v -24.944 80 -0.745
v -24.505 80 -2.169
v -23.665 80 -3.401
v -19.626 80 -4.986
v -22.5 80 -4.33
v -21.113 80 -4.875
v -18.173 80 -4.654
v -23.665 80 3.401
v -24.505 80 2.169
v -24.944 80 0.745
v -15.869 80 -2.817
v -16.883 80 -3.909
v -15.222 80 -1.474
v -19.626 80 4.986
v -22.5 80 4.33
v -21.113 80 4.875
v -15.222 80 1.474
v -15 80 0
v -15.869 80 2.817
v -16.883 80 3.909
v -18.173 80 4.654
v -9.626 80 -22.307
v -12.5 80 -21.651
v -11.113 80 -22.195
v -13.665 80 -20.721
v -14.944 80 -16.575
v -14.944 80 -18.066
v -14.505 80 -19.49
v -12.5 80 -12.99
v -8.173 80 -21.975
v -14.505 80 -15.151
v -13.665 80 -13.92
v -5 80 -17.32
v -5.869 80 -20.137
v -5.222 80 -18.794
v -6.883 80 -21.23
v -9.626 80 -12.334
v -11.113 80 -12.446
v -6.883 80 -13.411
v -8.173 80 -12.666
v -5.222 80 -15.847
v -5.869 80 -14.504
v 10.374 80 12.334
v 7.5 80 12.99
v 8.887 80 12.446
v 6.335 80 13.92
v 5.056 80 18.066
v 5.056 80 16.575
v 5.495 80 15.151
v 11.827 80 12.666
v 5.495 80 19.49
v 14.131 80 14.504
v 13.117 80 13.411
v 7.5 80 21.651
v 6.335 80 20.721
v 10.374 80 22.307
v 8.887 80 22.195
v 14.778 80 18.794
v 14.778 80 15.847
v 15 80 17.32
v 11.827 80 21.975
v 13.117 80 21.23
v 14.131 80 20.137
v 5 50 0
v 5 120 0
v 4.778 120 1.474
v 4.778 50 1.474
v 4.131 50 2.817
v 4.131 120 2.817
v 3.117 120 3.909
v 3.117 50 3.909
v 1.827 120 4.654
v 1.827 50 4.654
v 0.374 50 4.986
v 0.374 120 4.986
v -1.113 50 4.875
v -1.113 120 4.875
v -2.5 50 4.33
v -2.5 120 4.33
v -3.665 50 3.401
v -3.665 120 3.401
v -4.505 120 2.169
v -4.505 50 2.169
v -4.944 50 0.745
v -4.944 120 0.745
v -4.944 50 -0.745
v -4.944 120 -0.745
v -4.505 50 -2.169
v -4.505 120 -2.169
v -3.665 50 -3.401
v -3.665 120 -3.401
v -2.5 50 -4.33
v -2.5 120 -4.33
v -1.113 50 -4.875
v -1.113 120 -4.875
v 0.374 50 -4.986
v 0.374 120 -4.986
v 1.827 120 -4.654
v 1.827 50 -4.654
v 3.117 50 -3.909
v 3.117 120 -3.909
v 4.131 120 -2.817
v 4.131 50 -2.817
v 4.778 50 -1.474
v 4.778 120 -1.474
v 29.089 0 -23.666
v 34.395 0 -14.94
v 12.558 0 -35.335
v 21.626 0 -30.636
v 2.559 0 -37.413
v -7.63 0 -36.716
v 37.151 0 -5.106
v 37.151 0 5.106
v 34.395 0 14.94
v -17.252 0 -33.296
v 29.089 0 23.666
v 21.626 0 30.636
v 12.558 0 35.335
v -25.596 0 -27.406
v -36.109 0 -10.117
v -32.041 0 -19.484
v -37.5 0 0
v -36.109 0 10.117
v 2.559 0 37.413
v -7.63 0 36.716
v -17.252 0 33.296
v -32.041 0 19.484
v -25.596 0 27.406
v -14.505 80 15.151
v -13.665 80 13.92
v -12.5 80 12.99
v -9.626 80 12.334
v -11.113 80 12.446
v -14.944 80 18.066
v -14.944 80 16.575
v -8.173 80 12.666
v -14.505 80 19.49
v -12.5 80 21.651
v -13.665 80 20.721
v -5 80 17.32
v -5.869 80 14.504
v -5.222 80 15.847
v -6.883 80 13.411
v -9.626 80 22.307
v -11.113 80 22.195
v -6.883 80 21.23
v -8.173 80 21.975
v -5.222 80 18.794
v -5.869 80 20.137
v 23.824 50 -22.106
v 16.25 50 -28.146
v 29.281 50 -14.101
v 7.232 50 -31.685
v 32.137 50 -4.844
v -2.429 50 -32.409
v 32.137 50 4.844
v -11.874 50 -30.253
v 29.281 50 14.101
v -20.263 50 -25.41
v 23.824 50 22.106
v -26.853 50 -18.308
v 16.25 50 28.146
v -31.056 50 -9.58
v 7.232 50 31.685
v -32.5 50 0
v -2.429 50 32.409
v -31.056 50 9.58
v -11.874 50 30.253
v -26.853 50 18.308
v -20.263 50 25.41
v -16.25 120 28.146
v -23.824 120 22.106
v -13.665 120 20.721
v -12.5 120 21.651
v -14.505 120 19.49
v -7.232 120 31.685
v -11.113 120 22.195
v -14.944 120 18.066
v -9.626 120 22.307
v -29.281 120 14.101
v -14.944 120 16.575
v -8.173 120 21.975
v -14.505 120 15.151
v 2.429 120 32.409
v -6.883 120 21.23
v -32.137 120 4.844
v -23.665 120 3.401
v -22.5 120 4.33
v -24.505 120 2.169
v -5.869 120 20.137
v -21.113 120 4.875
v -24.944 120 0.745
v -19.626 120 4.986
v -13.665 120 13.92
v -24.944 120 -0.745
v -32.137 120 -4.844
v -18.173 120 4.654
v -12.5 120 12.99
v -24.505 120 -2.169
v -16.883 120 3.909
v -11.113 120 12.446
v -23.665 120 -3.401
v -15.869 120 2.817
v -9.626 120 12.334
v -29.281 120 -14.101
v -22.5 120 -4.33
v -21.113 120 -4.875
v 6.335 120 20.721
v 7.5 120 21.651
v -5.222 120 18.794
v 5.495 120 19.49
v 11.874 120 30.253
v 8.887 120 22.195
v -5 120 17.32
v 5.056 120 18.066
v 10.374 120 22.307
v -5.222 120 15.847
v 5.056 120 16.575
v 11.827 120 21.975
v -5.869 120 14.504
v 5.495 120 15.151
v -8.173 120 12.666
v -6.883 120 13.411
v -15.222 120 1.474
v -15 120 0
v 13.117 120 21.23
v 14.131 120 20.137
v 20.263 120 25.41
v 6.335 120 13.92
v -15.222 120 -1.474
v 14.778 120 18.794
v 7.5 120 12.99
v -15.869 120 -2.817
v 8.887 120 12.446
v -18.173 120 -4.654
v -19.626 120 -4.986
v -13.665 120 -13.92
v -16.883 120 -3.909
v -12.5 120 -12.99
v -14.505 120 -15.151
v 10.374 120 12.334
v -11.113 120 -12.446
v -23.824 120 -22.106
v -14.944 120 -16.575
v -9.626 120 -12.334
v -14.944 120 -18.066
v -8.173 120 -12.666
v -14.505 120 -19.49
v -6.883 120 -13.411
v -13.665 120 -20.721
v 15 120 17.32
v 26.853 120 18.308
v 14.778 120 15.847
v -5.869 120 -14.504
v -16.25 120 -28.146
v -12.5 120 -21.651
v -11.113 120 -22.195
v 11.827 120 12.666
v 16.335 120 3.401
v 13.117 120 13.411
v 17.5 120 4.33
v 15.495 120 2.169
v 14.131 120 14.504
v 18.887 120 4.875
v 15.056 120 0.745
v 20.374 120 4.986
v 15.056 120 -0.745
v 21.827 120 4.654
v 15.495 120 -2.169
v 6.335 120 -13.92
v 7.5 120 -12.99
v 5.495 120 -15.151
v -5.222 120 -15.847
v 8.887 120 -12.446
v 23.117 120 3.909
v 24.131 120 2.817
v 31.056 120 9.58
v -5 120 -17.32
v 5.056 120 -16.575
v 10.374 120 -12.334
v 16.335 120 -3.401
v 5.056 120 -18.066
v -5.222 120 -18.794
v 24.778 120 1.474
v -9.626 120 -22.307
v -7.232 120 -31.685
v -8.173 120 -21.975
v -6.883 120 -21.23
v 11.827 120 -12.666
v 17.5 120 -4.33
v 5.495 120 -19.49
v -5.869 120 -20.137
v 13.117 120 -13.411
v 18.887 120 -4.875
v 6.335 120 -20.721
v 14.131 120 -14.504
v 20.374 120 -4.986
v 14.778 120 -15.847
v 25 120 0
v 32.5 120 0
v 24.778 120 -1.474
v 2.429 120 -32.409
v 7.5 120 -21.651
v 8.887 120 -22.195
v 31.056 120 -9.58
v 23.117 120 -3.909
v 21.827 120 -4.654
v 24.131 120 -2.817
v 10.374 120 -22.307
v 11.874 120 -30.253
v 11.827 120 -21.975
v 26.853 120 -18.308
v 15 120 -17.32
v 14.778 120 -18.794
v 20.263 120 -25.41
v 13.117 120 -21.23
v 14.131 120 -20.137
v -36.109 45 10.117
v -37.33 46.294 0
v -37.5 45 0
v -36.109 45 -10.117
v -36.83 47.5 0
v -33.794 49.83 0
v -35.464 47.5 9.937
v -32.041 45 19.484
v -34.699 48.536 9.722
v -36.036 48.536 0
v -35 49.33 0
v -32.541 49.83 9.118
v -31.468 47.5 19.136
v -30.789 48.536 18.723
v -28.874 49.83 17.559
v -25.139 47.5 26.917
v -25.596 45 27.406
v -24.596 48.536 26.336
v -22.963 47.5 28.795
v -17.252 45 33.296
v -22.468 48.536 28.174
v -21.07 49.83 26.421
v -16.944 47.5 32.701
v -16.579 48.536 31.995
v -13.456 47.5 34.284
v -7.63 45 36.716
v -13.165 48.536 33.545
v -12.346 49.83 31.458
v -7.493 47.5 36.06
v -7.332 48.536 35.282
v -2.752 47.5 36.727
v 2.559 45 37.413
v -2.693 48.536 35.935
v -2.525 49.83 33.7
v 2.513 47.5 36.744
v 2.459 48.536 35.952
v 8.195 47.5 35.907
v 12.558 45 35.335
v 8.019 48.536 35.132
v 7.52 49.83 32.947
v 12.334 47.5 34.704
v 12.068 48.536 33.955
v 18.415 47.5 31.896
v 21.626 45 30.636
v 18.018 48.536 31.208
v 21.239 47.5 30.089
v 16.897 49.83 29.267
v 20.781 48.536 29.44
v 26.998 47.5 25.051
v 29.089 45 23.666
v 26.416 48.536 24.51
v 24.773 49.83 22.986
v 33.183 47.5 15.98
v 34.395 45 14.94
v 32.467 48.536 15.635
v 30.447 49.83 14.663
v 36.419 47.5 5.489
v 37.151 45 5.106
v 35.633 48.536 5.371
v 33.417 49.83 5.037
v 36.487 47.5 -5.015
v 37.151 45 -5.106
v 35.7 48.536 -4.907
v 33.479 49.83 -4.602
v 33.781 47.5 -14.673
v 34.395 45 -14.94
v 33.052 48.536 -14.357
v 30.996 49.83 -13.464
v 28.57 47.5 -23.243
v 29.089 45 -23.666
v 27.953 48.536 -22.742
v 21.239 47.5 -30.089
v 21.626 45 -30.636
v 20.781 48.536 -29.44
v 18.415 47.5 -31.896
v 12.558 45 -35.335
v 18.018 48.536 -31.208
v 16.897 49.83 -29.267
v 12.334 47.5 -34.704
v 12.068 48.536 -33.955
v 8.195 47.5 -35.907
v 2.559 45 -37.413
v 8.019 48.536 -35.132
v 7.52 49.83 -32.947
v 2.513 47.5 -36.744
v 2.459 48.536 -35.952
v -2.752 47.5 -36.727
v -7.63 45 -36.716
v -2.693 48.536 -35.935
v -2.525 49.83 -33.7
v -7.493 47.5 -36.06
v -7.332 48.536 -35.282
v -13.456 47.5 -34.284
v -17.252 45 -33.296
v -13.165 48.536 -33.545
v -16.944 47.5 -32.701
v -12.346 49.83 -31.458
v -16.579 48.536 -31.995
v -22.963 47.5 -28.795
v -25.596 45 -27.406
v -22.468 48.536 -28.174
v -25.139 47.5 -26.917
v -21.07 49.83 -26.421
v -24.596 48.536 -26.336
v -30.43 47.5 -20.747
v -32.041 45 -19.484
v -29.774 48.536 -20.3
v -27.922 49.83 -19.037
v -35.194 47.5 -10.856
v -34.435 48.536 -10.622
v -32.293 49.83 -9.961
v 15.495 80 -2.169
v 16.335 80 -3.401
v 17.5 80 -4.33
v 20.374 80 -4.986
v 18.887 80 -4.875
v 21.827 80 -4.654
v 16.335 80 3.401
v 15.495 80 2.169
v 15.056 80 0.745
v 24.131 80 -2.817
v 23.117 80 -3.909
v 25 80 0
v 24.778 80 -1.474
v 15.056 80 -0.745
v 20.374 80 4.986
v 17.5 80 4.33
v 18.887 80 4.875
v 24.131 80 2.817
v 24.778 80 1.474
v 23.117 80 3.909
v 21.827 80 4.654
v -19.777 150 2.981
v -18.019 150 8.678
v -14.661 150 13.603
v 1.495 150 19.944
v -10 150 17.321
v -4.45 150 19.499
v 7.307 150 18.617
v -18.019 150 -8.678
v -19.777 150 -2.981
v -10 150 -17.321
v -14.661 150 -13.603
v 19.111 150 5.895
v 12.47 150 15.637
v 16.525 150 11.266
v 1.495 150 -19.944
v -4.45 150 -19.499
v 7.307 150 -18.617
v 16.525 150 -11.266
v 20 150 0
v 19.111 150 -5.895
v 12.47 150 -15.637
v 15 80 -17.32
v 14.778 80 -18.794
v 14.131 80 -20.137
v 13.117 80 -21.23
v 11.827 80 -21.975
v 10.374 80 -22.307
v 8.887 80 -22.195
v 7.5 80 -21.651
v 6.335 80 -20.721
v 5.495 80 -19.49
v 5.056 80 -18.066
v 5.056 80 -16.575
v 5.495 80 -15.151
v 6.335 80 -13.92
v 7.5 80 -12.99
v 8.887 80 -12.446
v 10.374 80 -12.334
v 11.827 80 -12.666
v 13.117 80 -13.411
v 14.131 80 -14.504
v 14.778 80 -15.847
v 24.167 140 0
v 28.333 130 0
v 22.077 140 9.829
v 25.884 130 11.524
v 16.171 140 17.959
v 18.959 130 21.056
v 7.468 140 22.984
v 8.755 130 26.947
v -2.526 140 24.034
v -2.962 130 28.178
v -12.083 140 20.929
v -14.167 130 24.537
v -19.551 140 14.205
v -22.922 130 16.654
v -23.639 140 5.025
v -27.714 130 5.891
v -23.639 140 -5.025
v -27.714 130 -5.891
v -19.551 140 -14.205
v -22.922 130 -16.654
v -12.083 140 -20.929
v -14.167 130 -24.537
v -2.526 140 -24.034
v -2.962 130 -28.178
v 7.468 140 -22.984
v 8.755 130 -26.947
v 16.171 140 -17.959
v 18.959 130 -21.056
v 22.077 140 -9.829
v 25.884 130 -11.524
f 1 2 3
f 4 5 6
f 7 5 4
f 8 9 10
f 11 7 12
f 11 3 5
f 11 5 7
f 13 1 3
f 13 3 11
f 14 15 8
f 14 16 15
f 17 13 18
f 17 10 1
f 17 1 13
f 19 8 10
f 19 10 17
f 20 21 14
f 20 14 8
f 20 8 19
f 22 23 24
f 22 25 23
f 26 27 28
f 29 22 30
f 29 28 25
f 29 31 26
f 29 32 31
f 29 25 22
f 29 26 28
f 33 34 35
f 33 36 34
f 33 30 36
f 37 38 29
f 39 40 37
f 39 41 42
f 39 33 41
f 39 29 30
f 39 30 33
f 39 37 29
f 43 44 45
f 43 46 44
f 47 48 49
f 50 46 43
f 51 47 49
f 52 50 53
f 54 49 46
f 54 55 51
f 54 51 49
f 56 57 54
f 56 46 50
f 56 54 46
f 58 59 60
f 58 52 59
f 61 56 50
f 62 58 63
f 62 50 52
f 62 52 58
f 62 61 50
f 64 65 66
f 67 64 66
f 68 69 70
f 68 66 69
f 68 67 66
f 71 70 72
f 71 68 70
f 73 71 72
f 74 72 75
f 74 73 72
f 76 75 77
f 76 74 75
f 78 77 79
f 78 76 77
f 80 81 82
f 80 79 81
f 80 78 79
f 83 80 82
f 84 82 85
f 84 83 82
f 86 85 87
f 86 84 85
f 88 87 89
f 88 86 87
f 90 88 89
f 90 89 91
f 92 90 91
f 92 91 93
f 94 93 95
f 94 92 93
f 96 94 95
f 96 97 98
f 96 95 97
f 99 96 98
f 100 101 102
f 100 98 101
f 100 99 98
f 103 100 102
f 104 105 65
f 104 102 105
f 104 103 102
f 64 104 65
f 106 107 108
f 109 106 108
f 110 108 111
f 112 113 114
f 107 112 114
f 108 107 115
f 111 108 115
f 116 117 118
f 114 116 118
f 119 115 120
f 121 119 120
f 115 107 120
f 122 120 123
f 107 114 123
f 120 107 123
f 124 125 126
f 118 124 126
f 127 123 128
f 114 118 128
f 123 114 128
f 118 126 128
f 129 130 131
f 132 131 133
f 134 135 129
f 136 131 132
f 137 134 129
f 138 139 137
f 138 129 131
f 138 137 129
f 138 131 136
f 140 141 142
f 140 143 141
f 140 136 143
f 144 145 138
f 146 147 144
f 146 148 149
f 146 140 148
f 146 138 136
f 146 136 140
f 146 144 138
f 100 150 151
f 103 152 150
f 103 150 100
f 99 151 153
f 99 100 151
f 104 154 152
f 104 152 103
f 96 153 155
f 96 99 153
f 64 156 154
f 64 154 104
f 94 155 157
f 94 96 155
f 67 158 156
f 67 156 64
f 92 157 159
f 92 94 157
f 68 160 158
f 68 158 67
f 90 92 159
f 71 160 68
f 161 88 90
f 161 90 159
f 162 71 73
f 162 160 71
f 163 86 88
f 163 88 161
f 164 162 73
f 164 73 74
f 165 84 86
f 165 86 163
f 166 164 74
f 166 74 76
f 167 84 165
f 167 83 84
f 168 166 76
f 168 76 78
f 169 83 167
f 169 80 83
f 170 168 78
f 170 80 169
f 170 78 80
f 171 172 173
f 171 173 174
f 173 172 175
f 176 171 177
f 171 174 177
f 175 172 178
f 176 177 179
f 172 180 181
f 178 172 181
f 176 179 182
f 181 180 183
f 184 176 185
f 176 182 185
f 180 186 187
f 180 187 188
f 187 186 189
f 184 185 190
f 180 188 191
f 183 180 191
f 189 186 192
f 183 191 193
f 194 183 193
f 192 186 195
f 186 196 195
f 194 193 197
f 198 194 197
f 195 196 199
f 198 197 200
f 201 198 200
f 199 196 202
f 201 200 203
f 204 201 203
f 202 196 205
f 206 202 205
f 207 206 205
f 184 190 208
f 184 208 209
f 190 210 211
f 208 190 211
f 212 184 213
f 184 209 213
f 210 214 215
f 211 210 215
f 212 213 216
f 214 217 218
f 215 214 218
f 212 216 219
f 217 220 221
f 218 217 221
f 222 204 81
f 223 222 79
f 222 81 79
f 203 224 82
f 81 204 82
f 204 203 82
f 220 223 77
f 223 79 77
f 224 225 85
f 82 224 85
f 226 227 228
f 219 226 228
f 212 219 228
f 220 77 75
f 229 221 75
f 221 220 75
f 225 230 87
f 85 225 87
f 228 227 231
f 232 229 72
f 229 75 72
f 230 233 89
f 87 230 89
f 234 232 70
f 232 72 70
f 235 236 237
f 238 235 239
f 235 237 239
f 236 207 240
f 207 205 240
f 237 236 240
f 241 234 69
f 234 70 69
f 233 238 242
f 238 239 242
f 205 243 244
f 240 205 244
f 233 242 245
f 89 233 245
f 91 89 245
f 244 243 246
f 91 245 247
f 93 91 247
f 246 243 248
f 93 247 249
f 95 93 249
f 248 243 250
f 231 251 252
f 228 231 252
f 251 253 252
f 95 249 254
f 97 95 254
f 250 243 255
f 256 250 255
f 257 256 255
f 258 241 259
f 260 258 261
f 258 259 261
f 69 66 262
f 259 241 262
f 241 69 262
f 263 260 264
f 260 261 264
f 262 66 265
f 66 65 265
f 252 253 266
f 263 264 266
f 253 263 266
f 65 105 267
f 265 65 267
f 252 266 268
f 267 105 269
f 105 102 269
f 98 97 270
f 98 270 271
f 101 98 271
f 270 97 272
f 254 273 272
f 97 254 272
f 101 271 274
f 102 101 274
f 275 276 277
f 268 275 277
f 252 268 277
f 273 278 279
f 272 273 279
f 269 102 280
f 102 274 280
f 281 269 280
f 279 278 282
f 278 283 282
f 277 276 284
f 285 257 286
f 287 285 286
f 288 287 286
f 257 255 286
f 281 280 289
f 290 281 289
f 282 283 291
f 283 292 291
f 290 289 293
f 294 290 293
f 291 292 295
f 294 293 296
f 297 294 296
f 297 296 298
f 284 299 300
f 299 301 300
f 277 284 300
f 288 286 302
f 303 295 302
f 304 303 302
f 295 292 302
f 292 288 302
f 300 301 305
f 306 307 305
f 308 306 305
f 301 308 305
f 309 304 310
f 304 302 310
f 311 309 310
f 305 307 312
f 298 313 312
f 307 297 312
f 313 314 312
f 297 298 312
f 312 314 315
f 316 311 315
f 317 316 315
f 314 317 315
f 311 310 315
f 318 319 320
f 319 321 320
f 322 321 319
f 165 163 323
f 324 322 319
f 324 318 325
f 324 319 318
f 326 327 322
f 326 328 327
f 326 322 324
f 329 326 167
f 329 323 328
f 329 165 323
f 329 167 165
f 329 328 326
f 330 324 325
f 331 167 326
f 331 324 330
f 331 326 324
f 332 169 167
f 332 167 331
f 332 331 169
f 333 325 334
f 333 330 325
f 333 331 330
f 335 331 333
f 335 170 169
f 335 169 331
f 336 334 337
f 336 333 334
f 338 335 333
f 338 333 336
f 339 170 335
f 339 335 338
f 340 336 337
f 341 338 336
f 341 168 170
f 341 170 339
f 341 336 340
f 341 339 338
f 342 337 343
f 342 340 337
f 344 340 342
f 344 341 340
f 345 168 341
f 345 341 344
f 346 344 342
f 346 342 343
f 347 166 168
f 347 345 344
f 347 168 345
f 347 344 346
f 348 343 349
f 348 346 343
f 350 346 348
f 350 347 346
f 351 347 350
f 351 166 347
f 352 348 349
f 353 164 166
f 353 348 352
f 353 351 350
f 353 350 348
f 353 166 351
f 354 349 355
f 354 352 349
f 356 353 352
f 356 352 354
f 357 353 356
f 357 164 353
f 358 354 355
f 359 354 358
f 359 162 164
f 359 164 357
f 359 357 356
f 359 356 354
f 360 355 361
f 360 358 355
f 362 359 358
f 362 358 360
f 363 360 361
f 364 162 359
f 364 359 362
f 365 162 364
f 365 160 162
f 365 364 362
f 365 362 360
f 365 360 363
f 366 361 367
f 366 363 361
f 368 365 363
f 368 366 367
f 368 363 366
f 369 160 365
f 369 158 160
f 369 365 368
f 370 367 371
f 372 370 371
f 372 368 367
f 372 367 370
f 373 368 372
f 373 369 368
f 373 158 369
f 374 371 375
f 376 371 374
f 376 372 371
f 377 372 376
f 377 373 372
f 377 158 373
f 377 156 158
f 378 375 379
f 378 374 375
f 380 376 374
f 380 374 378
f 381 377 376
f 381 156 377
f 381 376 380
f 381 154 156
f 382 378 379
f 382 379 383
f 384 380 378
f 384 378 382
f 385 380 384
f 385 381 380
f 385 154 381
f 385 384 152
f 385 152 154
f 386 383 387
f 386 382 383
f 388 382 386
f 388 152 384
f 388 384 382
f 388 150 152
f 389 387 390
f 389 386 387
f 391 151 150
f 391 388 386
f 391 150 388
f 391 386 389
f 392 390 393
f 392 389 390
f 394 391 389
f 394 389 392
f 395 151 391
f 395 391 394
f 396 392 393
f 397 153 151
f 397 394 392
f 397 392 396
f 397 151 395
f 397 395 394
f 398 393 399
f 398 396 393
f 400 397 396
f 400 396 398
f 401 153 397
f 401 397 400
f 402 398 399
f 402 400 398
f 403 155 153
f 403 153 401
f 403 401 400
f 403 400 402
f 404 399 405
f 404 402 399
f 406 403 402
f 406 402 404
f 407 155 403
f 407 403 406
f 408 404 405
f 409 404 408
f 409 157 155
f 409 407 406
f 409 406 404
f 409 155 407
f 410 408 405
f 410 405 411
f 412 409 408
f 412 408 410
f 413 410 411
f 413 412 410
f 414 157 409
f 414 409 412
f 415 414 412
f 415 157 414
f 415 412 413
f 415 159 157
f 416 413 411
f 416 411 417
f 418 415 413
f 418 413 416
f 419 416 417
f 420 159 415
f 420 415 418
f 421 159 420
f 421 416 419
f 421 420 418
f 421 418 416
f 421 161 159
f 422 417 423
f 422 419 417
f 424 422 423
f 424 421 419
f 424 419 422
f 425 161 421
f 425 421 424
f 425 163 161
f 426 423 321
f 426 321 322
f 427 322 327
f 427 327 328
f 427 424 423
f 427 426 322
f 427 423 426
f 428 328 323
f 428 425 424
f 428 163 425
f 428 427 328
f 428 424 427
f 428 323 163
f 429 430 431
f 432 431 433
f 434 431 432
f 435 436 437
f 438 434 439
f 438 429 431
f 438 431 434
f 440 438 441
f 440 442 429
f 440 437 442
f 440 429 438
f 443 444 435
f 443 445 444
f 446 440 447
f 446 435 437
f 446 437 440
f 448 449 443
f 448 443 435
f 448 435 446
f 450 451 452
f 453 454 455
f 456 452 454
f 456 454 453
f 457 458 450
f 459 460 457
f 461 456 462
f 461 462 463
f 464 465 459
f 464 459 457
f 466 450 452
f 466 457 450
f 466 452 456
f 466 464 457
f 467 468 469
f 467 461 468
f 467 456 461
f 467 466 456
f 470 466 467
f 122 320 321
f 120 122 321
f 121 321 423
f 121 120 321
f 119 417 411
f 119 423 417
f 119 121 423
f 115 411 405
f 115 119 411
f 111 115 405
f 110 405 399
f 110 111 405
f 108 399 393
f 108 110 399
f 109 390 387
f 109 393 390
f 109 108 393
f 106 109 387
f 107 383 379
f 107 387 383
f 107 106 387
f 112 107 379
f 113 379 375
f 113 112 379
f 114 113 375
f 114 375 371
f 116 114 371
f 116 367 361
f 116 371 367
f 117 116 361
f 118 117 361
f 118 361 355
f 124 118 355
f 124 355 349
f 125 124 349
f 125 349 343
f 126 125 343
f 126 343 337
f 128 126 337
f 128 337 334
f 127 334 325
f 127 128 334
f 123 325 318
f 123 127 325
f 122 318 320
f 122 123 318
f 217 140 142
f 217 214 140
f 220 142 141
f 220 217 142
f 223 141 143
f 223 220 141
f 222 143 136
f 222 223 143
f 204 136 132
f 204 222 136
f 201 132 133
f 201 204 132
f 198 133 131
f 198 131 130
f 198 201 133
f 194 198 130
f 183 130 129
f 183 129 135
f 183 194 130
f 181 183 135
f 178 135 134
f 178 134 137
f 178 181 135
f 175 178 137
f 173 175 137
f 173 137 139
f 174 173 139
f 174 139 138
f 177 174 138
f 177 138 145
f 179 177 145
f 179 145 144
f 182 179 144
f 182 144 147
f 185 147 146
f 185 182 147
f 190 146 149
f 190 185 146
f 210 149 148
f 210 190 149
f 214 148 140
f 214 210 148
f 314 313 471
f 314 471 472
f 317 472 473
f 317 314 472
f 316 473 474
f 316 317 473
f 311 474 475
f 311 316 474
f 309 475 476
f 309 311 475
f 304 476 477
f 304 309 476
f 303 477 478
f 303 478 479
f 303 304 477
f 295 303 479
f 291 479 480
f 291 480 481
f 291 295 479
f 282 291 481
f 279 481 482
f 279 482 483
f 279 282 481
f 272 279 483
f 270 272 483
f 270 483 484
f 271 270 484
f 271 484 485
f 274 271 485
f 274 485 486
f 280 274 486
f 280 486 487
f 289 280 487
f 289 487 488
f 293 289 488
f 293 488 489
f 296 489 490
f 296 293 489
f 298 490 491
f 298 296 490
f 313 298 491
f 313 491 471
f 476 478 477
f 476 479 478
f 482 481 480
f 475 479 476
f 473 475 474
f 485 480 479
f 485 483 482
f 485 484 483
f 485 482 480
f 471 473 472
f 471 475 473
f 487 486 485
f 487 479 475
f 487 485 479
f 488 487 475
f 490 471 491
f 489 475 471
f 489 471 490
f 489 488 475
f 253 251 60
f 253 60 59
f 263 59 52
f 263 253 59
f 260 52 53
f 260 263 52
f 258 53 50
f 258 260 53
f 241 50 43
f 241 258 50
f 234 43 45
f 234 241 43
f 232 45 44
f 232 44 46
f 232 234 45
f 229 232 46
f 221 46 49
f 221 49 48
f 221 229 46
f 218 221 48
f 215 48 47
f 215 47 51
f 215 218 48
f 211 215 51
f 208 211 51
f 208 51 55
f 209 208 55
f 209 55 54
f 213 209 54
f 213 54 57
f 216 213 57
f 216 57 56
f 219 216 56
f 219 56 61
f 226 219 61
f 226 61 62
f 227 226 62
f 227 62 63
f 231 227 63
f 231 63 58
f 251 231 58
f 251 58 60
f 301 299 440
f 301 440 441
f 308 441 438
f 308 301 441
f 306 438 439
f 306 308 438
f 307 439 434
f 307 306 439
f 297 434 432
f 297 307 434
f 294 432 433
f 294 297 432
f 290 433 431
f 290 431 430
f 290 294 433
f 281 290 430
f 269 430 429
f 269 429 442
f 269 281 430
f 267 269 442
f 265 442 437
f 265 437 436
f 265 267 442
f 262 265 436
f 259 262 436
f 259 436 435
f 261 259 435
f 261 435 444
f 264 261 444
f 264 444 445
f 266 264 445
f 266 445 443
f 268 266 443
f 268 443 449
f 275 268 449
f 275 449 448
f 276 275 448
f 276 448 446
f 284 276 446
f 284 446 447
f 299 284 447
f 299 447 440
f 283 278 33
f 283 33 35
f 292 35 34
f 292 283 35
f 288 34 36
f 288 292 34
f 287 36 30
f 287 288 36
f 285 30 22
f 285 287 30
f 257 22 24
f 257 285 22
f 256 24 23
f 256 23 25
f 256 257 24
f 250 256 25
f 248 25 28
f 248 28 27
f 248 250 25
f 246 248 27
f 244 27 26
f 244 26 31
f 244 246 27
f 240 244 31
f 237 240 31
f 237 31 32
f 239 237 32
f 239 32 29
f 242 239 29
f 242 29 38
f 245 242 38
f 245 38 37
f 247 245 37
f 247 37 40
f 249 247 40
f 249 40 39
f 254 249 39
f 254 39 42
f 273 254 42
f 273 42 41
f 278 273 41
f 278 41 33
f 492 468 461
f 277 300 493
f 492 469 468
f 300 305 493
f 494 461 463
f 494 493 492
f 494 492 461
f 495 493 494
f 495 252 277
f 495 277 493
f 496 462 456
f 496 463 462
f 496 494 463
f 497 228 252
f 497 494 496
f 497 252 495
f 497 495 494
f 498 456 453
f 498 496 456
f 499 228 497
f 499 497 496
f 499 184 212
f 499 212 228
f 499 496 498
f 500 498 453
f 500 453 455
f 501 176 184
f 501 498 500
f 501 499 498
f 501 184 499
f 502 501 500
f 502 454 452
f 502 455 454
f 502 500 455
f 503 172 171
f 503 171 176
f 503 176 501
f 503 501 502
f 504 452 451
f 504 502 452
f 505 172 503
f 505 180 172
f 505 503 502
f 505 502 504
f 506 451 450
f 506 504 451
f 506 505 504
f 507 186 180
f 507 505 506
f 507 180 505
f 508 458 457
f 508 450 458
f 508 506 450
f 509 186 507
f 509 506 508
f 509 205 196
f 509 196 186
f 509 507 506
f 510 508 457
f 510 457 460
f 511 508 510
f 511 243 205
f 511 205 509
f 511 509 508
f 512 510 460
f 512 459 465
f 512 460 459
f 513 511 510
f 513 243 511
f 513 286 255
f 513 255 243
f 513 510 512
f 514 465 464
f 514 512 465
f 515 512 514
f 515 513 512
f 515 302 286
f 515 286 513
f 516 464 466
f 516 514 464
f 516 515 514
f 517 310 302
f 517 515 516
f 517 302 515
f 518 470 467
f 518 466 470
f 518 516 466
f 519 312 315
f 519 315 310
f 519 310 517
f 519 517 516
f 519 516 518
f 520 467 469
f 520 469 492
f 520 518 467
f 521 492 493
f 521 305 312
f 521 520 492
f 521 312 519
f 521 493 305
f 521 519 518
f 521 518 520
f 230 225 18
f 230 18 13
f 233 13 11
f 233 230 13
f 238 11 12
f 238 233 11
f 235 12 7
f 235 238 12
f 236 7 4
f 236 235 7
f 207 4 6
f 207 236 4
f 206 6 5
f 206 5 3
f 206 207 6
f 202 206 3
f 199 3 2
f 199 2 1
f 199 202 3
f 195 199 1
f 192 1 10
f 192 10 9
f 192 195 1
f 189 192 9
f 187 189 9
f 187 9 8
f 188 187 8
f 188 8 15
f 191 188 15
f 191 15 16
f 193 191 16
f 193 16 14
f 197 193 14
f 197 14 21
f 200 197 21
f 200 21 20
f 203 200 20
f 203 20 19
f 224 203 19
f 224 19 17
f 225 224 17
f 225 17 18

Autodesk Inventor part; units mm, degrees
ref_plane "YZ Plane" through (0, 0, 0) normal (1, 0, 0) x (0, 1, 0)
ref_plane "XZ Plane" through (0, 0, 0) normal (0, 1, 0) x (-1, 0, 0)
ref_plane "XY Plane" through (0, 0, 0) normal (0, 0, 1) x (1, 0, 0)
sketch "Sketch1" plane through (0, 0, 0) normal (0, 1, 0) x (-1, 0, 0)
  circle A0 centre (0, 0) radius 37.5
  dimension "d0" = 75
extrude "Extrusion1" add sketch "Sketch1" along normal blind 50
fillet "Fillet1" radius 5 1 edges at (37.5, 50, 0)
sketch "Sketch2" plane through (0, 50, 0) normal (0, 1, 0) x (1, 0, 0)
  circle A0 centre (0, 0) radius 5
  dimension "d4" = 10
extrude "Extrusion2" add sketch "Sketch2" along normal blind 70
sketch "Sketch3" plane through (0, 120, 0) normal (0, 1, 0) x (1, 0, 0)
  circle A0 centre (0, 0) radius 32.5
  dimension "d7" = 65
ref_plane "Work Plane1" through (0, 150, 0) normal (0, 1, 0) x (1, 0, 0)
sketch "Sketch4" plane through (0, 150, 0) normal (0, 1, 0) x (1, 0, 0)
  circle A0 centre (0, 0) radius 20
  dimension "d9" = 40
loft "Loft1" add profiles "Sketch3", "Sketch4"
sketch "Sketch5" plane through (0, 120, 0) normal (0, -1, 0) x (1, 0, 0)
  circle A0 centre (0, 0) radius 20 projected
  circle A1 centre (-20, 0) radius 5
  circle A2 centre (0, 0) radius 5 projected
  circle A3 centre (-10, -17.3205) radius 5
  circle A4 centre (10, -17.3205) radius 5
  circle A5 centre (20, 0) radius 5
  circle A6 centre (10, 17.3205) radius 5
  circle A7 centre (-10, 17.3205) radius 5
  dimension "d14" = 10
  dimension "d15" = 20
  dimension "d18" = 360
extrude "Extrusion3" add sketch "Sketch5" along normal blind 40 contours A0 A5 | A0 A5 | A6 A0 | A0 A6 | A4 A0 | A0 A4 | A7 A0 | A0 A7 | A3 A0 | A0 A3 | A1 A0 | A0 A1
properties part number "Main_Tower"
